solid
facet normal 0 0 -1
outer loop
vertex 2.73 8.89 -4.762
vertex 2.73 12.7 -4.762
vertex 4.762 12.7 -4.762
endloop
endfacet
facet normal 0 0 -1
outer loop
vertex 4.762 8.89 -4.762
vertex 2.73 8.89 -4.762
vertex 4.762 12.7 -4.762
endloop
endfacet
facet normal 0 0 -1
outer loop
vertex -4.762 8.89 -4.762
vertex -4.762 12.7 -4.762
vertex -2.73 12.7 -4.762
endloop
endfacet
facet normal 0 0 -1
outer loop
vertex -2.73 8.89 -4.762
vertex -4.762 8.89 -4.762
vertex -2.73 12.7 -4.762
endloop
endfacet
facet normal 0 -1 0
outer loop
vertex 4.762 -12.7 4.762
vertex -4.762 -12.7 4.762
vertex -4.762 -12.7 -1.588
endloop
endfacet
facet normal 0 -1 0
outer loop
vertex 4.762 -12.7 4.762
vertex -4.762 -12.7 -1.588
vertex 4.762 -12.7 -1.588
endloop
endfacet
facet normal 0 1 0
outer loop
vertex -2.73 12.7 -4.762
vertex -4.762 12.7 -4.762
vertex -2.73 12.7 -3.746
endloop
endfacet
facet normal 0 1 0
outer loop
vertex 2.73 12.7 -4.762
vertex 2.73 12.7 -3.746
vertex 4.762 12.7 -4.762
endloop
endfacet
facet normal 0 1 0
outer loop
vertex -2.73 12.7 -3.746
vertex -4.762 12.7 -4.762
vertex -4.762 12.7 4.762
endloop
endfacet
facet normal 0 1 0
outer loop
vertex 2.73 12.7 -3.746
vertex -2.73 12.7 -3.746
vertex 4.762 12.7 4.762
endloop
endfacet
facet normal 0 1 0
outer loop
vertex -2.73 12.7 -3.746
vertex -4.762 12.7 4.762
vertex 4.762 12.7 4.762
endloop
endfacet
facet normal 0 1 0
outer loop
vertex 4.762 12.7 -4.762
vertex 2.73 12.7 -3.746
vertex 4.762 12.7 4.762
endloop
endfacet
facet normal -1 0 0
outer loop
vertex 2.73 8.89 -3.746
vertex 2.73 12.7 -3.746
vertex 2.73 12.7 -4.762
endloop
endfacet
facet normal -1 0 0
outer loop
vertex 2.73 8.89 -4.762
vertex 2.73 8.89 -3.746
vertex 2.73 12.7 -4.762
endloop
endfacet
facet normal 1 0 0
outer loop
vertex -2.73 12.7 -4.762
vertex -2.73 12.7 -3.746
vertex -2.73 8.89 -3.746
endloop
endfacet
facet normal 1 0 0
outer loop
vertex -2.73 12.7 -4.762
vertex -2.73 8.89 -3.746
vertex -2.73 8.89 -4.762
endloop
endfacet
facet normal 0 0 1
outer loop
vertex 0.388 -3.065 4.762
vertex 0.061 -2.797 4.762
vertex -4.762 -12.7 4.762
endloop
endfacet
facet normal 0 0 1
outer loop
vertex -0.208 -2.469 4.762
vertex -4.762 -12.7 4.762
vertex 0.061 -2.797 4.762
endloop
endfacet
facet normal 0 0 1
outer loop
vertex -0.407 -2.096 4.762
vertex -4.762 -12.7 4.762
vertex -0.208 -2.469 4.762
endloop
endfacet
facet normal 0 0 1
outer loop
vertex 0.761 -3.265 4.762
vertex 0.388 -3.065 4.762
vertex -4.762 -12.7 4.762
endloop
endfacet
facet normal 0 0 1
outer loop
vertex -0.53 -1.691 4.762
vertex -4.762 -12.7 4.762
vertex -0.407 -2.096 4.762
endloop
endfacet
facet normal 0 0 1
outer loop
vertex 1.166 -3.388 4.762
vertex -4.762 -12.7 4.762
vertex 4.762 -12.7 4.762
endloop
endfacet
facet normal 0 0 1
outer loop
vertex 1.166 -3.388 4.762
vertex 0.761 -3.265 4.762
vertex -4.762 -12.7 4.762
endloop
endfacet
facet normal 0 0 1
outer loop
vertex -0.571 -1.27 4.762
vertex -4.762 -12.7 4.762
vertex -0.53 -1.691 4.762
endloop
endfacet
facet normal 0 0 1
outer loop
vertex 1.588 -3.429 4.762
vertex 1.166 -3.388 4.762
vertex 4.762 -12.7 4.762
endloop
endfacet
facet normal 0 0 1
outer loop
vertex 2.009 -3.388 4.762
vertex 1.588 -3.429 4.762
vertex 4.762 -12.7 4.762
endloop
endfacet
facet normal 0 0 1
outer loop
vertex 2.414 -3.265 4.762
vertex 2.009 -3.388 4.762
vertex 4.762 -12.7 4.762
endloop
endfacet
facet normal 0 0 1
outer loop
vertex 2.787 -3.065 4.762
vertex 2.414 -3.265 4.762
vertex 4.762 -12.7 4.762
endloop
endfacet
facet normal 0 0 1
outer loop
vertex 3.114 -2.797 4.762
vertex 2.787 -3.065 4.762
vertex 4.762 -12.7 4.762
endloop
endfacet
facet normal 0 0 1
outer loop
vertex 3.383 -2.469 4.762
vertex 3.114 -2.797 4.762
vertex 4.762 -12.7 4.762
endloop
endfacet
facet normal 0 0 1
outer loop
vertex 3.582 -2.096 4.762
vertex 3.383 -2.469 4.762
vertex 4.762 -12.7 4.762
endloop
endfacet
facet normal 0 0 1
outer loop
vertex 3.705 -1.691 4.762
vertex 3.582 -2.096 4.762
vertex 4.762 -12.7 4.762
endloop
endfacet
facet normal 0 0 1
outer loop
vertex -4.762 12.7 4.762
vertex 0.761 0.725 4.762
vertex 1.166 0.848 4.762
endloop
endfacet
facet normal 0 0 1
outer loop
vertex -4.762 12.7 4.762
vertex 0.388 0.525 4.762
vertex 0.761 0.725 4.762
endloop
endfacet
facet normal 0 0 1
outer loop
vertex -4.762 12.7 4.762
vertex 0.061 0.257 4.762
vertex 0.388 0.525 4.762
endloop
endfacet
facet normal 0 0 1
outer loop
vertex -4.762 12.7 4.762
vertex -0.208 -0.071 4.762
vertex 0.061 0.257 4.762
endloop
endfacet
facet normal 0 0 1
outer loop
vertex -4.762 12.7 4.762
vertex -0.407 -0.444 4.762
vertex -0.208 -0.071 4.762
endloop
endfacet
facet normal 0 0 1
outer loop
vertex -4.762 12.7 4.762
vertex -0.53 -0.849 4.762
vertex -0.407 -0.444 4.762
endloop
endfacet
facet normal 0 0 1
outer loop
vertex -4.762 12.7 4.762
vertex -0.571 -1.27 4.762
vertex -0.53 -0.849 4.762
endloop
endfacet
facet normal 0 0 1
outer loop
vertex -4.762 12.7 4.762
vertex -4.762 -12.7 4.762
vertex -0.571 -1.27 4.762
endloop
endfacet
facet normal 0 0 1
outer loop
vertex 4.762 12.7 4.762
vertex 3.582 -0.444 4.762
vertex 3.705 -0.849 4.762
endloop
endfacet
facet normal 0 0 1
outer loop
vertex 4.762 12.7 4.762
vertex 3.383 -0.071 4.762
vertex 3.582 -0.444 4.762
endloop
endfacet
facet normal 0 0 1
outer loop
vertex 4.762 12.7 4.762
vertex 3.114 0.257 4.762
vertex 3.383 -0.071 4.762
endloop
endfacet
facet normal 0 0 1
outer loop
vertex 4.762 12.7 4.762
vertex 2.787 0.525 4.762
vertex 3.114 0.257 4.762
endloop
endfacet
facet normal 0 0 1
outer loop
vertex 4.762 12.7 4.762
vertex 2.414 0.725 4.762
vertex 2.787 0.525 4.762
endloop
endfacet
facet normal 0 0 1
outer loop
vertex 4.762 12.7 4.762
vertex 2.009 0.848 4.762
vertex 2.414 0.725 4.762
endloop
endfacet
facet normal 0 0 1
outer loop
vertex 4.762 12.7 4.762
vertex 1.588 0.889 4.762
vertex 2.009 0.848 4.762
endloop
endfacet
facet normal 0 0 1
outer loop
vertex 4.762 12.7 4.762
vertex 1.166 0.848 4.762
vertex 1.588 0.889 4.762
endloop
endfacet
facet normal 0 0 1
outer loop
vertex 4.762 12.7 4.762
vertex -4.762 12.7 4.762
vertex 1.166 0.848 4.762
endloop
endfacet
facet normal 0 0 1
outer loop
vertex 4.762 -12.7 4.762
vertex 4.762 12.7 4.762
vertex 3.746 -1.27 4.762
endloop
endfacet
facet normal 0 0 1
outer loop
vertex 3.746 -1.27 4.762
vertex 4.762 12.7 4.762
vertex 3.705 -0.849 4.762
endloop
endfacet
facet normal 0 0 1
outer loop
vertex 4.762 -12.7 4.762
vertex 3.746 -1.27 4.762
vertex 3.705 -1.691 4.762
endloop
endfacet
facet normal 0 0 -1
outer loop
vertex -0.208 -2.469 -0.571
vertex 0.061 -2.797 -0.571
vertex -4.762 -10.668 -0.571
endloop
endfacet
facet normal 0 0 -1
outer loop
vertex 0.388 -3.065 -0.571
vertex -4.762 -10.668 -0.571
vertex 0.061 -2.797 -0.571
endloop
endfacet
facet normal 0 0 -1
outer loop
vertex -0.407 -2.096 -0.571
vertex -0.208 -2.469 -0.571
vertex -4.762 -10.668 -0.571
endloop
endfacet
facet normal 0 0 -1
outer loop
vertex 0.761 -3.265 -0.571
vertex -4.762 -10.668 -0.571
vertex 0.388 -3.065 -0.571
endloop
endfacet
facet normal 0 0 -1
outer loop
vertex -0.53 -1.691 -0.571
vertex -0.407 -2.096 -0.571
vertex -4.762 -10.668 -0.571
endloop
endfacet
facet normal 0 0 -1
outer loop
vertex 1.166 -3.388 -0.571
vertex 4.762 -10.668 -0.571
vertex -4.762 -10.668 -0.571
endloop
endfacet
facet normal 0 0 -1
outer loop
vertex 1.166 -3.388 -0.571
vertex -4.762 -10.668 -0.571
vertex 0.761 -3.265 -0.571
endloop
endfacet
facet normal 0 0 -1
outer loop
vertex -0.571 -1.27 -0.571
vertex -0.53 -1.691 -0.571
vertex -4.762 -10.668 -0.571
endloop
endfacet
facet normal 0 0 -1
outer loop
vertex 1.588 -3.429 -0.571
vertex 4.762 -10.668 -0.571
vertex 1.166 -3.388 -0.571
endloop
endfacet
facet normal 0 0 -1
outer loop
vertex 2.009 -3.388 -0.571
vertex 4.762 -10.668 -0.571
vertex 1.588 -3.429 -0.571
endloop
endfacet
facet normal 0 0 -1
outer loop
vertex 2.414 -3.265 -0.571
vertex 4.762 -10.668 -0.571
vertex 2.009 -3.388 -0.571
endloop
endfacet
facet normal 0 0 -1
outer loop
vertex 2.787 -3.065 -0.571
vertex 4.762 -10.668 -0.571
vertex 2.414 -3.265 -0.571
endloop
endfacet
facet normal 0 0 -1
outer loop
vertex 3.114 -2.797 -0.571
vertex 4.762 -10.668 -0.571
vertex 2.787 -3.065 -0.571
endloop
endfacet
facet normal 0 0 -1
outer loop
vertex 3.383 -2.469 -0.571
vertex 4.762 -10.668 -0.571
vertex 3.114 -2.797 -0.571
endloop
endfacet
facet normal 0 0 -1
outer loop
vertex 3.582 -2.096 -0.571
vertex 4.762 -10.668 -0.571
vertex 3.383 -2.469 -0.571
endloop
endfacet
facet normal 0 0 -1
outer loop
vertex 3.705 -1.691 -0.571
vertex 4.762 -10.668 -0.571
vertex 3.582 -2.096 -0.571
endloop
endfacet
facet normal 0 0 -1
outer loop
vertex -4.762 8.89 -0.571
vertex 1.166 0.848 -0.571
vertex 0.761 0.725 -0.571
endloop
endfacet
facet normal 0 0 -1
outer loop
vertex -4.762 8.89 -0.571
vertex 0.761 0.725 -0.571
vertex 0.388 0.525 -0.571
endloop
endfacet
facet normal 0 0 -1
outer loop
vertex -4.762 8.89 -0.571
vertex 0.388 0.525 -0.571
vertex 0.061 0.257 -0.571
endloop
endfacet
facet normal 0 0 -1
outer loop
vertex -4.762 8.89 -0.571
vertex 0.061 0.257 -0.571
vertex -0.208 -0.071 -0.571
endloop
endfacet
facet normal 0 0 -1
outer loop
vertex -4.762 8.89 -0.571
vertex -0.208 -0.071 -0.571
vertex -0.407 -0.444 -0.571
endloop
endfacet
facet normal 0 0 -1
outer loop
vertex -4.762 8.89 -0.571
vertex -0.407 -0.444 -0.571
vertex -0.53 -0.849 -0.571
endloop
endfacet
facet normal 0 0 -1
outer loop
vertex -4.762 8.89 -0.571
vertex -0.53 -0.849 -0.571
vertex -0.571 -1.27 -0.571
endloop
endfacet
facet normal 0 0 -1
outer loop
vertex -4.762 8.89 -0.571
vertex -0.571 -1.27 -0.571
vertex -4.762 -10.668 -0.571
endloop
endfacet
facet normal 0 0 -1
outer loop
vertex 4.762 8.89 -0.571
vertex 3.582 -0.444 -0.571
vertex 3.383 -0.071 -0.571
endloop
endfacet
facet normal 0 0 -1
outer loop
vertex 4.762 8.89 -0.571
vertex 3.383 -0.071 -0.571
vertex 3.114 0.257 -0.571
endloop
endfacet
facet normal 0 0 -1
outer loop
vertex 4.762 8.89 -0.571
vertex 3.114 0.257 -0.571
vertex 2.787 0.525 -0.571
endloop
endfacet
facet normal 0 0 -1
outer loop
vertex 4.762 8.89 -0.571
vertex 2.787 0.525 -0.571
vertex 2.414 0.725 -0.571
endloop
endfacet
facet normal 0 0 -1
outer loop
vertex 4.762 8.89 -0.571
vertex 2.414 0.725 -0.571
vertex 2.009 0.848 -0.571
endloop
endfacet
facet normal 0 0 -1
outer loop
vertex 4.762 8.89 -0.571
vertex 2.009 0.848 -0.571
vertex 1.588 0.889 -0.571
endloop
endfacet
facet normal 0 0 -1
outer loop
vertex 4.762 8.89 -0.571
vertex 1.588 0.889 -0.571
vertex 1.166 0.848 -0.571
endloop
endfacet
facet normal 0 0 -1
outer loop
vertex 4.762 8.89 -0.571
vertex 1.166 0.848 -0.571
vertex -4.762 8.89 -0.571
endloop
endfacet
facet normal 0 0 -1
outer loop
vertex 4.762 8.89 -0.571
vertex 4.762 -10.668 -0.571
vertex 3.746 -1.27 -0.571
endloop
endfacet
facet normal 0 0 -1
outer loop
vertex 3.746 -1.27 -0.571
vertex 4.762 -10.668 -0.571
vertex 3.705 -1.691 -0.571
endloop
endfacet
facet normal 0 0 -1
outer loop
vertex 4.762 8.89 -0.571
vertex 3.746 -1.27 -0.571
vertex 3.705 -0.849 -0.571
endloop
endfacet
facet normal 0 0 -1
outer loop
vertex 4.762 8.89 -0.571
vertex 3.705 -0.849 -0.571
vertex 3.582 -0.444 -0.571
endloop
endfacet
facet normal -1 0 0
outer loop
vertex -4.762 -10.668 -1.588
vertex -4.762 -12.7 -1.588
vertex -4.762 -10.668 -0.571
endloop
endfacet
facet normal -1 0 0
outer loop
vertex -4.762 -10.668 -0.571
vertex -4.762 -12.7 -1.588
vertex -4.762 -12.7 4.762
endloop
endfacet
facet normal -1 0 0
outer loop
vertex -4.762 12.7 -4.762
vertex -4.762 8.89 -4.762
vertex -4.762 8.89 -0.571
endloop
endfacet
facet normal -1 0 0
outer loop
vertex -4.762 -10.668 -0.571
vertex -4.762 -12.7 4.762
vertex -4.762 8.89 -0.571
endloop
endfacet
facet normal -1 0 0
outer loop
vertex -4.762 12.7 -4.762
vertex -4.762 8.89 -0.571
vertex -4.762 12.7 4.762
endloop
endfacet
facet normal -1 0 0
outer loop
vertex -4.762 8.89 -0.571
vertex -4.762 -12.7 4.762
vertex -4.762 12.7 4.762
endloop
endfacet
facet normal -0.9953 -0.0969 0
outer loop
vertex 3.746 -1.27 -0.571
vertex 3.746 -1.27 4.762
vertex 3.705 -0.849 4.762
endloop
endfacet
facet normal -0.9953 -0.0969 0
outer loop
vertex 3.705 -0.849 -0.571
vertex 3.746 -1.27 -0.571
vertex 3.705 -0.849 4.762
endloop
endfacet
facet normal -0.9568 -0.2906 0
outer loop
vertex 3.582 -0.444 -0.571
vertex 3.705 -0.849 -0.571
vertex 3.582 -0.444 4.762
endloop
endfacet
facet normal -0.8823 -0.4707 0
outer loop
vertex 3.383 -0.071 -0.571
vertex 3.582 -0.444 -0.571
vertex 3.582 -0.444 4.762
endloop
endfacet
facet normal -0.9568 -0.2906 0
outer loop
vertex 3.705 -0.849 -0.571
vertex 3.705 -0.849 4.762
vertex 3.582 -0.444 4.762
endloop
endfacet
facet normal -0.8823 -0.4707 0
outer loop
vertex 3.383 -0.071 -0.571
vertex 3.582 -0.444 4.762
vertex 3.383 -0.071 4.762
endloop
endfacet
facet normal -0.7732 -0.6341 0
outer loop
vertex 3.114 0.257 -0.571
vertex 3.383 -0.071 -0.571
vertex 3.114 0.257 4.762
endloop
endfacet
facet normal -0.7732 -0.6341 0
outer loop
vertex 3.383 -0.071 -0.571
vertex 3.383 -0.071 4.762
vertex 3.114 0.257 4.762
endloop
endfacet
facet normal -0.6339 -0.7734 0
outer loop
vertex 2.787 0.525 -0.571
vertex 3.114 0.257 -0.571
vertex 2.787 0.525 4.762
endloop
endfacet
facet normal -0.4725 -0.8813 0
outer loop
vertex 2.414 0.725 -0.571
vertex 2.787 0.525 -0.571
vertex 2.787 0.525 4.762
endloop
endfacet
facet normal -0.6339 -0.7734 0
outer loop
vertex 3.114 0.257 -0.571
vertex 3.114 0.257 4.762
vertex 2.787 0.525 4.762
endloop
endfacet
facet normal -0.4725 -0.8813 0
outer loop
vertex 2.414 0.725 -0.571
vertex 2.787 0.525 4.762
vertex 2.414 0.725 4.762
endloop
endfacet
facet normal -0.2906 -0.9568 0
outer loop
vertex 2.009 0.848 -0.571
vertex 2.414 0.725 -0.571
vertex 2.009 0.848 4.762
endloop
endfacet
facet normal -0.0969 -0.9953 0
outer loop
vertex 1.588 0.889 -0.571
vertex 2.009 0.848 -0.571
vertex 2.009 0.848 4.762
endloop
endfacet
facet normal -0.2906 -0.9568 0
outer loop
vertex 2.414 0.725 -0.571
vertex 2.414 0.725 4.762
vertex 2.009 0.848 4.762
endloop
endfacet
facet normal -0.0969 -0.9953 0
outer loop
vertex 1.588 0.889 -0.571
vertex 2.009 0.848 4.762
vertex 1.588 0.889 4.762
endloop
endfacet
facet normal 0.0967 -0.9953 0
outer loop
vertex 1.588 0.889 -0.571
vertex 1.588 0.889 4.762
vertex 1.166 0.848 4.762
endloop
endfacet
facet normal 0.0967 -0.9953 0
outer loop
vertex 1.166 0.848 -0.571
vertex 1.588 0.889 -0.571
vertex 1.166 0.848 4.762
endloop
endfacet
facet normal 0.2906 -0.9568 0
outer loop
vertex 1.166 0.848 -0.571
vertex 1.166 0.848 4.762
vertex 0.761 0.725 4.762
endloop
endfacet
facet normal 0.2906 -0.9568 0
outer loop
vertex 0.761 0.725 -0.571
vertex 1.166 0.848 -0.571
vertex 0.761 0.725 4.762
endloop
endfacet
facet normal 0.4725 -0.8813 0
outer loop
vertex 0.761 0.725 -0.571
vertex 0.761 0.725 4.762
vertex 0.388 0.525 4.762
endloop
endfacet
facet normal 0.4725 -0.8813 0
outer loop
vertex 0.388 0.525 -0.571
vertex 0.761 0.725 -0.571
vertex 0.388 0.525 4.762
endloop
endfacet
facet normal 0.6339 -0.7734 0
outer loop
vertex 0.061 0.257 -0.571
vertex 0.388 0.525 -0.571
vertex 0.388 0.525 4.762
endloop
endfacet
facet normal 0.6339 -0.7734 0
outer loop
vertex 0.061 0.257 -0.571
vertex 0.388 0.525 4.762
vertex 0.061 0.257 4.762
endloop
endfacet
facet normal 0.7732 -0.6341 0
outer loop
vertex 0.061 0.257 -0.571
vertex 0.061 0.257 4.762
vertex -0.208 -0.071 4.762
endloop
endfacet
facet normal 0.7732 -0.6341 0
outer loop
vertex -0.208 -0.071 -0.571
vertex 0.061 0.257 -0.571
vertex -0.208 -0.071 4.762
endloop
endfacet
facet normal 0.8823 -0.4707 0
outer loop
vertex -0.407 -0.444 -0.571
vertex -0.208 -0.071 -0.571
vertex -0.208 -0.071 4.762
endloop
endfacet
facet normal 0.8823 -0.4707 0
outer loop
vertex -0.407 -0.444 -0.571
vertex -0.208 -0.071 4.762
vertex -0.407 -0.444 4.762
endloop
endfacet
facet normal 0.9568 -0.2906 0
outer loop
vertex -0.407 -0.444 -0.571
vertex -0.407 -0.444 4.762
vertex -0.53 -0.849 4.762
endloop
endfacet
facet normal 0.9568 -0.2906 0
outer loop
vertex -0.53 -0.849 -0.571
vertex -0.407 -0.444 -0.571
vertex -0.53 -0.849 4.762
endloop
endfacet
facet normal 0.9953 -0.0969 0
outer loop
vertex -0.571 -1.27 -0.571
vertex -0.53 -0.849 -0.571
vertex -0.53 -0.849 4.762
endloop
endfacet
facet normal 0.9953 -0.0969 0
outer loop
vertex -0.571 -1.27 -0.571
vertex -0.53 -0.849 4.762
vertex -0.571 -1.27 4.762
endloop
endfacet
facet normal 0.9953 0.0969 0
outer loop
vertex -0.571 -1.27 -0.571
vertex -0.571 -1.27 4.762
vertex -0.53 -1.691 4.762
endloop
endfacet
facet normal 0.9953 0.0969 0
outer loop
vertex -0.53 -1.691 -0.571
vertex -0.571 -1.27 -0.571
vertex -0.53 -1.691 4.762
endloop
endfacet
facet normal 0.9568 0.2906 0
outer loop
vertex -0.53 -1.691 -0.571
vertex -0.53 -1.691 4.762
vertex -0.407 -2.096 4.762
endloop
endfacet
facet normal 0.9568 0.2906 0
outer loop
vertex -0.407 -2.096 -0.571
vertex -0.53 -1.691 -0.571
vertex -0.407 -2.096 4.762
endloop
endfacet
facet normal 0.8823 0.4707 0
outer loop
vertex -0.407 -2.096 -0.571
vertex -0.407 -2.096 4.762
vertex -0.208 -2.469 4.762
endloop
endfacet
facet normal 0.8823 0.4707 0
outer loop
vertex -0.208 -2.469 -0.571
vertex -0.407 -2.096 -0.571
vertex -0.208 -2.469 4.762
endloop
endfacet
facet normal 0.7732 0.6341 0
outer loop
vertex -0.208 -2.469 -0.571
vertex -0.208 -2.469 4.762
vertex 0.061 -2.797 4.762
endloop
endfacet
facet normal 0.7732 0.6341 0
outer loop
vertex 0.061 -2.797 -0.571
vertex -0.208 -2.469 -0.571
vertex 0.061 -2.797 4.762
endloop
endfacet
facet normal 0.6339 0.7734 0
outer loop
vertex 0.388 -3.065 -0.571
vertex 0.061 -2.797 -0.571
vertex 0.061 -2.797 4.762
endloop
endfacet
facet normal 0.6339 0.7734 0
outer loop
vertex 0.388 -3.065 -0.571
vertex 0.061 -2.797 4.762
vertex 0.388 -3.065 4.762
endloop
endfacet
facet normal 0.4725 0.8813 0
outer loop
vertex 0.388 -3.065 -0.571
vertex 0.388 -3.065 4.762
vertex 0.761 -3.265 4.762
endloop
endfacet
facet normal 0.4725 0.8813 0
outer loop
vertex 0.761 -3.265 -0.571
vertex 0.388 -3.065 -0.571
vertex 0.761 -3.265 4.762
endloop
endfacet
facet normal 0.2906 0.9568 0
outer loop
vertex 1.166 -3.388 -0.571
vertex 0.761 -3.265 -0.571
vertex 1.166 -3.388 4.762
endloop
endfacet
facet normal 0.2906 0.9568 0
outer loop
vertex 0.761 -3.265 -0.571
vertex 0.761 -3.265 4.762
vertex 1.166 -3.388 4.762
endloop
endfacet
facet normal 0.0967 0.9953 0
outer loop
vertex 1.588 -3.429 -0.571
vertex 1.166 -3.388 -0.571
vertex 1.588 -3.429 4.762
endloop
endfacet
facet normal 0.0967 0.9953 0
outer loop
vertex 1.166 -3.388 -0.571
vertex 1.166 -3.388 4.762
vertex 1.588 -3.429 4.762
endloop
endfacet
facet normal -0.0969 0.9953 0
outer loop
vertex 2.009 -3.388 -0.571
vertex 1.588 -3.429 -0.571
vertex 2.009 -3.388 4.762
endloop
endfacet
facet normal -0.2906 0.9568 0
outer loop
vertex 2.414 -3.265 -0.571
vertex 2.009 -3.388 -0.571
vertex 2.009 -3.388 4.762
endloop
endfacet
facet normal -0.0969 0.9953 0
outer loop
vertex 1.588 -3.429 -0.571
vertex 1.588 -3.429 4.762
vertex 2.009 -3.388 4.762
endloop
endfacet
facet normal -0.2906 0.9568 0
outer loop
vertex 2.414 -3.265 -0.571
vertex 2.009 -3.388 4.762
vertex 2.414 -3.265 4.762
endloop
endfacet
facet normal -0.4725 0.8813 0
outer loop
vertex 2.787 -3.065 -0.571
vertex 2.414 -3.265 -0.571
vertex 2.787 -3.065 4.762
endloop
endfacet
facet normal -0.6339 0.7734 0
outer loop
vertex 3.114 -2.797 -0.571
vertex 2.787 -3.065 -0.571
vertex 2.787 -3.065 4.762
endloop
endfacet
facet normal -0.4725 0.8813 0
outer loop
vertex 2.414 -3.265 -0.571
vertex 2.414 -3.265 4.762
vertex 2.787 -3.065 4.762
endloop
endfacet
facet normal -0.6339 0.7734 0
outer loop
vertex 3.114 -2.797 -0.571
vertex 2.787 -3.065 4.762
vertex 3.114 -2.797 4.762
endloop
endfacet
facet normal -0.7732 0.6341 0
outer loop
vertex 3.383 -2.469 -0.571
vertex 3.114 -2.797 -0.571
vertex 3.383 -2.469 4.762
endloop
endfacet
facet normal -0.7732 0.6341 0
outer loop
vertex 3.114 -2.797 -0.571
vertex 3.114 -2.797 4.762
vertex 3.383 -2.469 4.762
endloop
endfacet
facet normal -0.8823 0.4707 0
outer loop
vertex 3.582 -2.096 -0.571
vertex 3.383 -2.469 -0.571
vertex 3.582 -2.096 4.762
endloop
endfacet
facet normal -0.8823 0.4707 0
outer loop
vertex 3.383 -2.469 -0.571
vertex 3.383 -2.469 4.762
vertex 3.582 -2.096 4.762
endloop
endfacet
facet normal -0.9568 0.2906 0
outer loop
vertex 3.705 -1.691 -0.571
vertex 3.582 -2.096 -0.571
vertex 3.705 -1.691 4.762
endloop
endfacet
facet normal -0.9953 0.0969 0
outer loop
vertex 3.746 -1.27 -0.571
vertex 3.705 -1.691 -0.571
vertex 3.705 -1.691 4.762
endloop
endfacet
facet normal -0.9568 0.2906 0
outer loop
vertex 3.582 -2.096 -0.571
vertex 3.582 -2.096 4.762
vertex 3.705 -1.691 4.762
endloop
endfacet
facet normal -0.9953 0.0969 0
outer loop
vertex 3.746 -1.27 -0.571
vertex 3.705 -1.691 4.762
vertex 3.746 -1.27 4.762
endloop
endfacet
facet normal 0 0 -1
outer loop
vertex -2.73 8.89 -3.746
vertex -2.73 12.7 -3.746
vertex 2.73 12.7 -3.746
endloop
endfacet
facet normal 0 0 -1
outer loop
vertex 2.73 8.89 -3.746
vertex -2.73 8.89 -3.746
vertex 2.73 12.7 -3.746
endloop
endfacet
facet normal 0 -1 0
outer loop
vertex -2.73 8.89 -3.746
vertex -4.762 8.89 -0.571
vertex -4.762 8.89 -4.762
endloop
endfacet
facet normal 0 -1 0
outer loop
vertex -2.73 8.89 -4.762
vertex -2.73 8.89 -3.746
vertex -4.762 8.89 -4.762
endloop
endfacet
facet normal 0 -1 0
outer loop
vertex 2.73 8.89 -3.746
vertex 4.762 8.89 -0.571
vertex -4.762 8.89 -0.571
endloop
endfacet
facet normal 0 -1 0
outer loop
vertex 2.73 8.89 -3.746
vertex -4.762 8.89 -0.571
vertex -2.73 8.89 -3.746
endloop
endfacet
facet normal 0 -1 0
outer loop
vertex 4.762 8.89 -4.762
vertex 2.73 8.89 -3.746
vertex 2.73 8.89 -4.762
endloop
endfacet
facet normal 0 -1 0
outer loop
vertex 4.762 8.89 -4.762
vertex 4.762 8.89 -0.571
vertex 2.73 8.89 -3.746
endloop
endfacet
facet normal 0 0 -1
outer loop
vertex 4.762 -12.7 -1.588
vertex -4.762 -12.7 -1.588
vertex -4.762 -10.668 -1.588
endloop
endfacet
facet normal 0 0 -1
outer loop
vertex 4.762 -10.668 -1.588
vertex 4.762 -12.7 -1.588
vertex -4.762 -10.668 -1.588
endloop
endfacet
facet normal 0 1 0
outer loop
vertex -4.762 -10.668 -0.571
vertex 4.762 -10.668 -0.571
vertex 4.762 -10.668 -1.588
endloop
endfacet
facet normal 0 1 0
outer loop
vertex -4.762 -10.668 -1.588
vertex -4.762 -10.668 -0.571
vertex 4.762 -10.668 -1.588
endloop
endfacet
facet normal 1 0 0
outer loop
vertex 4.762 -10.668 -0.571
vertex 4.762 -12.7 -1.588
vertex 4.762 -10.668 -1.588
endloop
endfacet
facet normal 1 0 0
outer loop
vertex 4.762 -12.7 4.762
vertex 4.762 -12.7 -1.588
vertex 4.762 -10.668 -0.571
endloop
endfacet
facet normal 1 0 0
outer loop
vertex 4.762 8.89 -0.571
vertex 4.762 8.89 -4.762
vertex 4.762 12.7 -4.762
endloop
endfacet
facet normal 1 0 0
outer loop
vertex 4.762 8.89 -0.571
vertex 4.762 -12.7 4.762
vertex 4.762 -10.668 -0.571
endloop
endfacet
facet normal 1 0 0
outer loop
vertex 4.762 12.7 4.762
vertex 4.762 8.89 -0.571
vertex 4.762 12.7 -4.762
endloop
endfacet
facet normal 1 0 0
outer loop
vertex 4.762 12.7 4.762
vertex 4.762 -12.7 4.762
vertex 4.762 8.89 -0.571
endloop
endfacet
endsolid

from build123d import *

# Parameters (mm, degrees)
SKETCH1_W           = 9.525
SKETCH1_H           = 25.4
BOSS_EXTRUDE1_DEPTH = 4.7625
CUT_EXTRUDE1_REACH  = 18.574
SKETCH2_W           = 3.175
SKETCH2_H           = 21.59
CUT_EXTRUDE2_REACH  = 18.574
SKETCH3_R           = 2.159
CUT_EXTRUDE3_REACH  = 28.278
SKETCH4_W           = 5.461
SKETCH4_H           = 1.016
SKETCH5_W           = 1.016
SKETCH5_H           = 19.558
CUT_EXTRUDE4_DEPTH  = 17.573986583


with BuildPart() as part:
    # Sketch1 → Boss-Extrude1 (new, symmetric)
    with BuildSketch(Plane.XY):
        Rectangle(SKETCH1_W, SKETCH1_H)
    extrude(amount=BOSS_EXTRUDE1_DEPTH, both=True)

    # Sketch2 → Cut-Extrude1 (cut, up to next)
    with BuildSketch(Plane(origin=(4.7625, 0, 0), x_dir=(0, 0, -1), z_dir=(1, 0, 0)), mode=Mode.PRIVATE) as cut_extrude1_sk1:
        with Locations((3.175, -1.905)):
            Rectangle(SKETCH2_W, SKETCH2_H)
    cut_extrude1_tool1 = extrude(cut_extrude1_sk1.sketch, amount=-CUT_EXTRUDE1_REACH, mode=Mode.PRIVATE) & part.part
    add(cut_extrude1_tool1.solids().sort_by_distance((4.7625, -1.905, -3.175))[0], mode=Mode.SUBTRACT)

    # Sketch3 → Cut-Extrude2 (cut, up to next)
    with BuildSketch(Plane.XY.offset(4.7625), mode=Mode.PRIVATE) as cut_extrude2_sk1:
        with Locations((1.5875, -1.27)):
            Circle(SKETCH3_R)
    cut_extrude2_tool1 = extrude(cut_extrude2_sk1.sketch, amount=-CUT_EXTRUDE2_REACH, mode=Mode.PRIVATE) & part.part
    add(cut_extrude2_tool1.solids().sort_by_distance((1.5875, -1.27, 4.7625))[0], mode=Mode.SUBTRACT)

    # Sketch4 → Cut-Extrude3 (cut, up to next)
    with BuildSketch(Plane(origin=(0, 12.7, 0), x_dir=(1, 0, 0), z_dir=(0, 1, 0)), mode=Mode.PRIVATE) as cut_extrude3_sk1:
        with Locations((0, 4.2545)):
            Rectangle(SKETCH4_W, SKETCH4_H)
    cut_extrude3_tool1 = extrude(cut_extrude3_sk1.sketch, amount=-CUT_EXTRUDE3_REACH, mode=Mode.PRIVATE) & part.part
    add(cut_extrude3_tool1.solids().sort_by_distance((0, 12.7, -4.2545))[0], mode=Mode.SUBTRACT)

    # Sketch5 → Cut-Extrude4 (cut, through all)
    with BuildSketch(Plane(origin=(4.7625, 0, 0), x_dir=(0, 0, -1), z_dir=(1, 0, 0))):
        with Locations((1.0795, -0.889)):
            Rectangle(SKETCH5_W, SKETCH5_H)
    extrude(amount=-CUT_EXTRUDE4_DEPTH, mode=Mode.SUBTRACT)


solid = part.part
